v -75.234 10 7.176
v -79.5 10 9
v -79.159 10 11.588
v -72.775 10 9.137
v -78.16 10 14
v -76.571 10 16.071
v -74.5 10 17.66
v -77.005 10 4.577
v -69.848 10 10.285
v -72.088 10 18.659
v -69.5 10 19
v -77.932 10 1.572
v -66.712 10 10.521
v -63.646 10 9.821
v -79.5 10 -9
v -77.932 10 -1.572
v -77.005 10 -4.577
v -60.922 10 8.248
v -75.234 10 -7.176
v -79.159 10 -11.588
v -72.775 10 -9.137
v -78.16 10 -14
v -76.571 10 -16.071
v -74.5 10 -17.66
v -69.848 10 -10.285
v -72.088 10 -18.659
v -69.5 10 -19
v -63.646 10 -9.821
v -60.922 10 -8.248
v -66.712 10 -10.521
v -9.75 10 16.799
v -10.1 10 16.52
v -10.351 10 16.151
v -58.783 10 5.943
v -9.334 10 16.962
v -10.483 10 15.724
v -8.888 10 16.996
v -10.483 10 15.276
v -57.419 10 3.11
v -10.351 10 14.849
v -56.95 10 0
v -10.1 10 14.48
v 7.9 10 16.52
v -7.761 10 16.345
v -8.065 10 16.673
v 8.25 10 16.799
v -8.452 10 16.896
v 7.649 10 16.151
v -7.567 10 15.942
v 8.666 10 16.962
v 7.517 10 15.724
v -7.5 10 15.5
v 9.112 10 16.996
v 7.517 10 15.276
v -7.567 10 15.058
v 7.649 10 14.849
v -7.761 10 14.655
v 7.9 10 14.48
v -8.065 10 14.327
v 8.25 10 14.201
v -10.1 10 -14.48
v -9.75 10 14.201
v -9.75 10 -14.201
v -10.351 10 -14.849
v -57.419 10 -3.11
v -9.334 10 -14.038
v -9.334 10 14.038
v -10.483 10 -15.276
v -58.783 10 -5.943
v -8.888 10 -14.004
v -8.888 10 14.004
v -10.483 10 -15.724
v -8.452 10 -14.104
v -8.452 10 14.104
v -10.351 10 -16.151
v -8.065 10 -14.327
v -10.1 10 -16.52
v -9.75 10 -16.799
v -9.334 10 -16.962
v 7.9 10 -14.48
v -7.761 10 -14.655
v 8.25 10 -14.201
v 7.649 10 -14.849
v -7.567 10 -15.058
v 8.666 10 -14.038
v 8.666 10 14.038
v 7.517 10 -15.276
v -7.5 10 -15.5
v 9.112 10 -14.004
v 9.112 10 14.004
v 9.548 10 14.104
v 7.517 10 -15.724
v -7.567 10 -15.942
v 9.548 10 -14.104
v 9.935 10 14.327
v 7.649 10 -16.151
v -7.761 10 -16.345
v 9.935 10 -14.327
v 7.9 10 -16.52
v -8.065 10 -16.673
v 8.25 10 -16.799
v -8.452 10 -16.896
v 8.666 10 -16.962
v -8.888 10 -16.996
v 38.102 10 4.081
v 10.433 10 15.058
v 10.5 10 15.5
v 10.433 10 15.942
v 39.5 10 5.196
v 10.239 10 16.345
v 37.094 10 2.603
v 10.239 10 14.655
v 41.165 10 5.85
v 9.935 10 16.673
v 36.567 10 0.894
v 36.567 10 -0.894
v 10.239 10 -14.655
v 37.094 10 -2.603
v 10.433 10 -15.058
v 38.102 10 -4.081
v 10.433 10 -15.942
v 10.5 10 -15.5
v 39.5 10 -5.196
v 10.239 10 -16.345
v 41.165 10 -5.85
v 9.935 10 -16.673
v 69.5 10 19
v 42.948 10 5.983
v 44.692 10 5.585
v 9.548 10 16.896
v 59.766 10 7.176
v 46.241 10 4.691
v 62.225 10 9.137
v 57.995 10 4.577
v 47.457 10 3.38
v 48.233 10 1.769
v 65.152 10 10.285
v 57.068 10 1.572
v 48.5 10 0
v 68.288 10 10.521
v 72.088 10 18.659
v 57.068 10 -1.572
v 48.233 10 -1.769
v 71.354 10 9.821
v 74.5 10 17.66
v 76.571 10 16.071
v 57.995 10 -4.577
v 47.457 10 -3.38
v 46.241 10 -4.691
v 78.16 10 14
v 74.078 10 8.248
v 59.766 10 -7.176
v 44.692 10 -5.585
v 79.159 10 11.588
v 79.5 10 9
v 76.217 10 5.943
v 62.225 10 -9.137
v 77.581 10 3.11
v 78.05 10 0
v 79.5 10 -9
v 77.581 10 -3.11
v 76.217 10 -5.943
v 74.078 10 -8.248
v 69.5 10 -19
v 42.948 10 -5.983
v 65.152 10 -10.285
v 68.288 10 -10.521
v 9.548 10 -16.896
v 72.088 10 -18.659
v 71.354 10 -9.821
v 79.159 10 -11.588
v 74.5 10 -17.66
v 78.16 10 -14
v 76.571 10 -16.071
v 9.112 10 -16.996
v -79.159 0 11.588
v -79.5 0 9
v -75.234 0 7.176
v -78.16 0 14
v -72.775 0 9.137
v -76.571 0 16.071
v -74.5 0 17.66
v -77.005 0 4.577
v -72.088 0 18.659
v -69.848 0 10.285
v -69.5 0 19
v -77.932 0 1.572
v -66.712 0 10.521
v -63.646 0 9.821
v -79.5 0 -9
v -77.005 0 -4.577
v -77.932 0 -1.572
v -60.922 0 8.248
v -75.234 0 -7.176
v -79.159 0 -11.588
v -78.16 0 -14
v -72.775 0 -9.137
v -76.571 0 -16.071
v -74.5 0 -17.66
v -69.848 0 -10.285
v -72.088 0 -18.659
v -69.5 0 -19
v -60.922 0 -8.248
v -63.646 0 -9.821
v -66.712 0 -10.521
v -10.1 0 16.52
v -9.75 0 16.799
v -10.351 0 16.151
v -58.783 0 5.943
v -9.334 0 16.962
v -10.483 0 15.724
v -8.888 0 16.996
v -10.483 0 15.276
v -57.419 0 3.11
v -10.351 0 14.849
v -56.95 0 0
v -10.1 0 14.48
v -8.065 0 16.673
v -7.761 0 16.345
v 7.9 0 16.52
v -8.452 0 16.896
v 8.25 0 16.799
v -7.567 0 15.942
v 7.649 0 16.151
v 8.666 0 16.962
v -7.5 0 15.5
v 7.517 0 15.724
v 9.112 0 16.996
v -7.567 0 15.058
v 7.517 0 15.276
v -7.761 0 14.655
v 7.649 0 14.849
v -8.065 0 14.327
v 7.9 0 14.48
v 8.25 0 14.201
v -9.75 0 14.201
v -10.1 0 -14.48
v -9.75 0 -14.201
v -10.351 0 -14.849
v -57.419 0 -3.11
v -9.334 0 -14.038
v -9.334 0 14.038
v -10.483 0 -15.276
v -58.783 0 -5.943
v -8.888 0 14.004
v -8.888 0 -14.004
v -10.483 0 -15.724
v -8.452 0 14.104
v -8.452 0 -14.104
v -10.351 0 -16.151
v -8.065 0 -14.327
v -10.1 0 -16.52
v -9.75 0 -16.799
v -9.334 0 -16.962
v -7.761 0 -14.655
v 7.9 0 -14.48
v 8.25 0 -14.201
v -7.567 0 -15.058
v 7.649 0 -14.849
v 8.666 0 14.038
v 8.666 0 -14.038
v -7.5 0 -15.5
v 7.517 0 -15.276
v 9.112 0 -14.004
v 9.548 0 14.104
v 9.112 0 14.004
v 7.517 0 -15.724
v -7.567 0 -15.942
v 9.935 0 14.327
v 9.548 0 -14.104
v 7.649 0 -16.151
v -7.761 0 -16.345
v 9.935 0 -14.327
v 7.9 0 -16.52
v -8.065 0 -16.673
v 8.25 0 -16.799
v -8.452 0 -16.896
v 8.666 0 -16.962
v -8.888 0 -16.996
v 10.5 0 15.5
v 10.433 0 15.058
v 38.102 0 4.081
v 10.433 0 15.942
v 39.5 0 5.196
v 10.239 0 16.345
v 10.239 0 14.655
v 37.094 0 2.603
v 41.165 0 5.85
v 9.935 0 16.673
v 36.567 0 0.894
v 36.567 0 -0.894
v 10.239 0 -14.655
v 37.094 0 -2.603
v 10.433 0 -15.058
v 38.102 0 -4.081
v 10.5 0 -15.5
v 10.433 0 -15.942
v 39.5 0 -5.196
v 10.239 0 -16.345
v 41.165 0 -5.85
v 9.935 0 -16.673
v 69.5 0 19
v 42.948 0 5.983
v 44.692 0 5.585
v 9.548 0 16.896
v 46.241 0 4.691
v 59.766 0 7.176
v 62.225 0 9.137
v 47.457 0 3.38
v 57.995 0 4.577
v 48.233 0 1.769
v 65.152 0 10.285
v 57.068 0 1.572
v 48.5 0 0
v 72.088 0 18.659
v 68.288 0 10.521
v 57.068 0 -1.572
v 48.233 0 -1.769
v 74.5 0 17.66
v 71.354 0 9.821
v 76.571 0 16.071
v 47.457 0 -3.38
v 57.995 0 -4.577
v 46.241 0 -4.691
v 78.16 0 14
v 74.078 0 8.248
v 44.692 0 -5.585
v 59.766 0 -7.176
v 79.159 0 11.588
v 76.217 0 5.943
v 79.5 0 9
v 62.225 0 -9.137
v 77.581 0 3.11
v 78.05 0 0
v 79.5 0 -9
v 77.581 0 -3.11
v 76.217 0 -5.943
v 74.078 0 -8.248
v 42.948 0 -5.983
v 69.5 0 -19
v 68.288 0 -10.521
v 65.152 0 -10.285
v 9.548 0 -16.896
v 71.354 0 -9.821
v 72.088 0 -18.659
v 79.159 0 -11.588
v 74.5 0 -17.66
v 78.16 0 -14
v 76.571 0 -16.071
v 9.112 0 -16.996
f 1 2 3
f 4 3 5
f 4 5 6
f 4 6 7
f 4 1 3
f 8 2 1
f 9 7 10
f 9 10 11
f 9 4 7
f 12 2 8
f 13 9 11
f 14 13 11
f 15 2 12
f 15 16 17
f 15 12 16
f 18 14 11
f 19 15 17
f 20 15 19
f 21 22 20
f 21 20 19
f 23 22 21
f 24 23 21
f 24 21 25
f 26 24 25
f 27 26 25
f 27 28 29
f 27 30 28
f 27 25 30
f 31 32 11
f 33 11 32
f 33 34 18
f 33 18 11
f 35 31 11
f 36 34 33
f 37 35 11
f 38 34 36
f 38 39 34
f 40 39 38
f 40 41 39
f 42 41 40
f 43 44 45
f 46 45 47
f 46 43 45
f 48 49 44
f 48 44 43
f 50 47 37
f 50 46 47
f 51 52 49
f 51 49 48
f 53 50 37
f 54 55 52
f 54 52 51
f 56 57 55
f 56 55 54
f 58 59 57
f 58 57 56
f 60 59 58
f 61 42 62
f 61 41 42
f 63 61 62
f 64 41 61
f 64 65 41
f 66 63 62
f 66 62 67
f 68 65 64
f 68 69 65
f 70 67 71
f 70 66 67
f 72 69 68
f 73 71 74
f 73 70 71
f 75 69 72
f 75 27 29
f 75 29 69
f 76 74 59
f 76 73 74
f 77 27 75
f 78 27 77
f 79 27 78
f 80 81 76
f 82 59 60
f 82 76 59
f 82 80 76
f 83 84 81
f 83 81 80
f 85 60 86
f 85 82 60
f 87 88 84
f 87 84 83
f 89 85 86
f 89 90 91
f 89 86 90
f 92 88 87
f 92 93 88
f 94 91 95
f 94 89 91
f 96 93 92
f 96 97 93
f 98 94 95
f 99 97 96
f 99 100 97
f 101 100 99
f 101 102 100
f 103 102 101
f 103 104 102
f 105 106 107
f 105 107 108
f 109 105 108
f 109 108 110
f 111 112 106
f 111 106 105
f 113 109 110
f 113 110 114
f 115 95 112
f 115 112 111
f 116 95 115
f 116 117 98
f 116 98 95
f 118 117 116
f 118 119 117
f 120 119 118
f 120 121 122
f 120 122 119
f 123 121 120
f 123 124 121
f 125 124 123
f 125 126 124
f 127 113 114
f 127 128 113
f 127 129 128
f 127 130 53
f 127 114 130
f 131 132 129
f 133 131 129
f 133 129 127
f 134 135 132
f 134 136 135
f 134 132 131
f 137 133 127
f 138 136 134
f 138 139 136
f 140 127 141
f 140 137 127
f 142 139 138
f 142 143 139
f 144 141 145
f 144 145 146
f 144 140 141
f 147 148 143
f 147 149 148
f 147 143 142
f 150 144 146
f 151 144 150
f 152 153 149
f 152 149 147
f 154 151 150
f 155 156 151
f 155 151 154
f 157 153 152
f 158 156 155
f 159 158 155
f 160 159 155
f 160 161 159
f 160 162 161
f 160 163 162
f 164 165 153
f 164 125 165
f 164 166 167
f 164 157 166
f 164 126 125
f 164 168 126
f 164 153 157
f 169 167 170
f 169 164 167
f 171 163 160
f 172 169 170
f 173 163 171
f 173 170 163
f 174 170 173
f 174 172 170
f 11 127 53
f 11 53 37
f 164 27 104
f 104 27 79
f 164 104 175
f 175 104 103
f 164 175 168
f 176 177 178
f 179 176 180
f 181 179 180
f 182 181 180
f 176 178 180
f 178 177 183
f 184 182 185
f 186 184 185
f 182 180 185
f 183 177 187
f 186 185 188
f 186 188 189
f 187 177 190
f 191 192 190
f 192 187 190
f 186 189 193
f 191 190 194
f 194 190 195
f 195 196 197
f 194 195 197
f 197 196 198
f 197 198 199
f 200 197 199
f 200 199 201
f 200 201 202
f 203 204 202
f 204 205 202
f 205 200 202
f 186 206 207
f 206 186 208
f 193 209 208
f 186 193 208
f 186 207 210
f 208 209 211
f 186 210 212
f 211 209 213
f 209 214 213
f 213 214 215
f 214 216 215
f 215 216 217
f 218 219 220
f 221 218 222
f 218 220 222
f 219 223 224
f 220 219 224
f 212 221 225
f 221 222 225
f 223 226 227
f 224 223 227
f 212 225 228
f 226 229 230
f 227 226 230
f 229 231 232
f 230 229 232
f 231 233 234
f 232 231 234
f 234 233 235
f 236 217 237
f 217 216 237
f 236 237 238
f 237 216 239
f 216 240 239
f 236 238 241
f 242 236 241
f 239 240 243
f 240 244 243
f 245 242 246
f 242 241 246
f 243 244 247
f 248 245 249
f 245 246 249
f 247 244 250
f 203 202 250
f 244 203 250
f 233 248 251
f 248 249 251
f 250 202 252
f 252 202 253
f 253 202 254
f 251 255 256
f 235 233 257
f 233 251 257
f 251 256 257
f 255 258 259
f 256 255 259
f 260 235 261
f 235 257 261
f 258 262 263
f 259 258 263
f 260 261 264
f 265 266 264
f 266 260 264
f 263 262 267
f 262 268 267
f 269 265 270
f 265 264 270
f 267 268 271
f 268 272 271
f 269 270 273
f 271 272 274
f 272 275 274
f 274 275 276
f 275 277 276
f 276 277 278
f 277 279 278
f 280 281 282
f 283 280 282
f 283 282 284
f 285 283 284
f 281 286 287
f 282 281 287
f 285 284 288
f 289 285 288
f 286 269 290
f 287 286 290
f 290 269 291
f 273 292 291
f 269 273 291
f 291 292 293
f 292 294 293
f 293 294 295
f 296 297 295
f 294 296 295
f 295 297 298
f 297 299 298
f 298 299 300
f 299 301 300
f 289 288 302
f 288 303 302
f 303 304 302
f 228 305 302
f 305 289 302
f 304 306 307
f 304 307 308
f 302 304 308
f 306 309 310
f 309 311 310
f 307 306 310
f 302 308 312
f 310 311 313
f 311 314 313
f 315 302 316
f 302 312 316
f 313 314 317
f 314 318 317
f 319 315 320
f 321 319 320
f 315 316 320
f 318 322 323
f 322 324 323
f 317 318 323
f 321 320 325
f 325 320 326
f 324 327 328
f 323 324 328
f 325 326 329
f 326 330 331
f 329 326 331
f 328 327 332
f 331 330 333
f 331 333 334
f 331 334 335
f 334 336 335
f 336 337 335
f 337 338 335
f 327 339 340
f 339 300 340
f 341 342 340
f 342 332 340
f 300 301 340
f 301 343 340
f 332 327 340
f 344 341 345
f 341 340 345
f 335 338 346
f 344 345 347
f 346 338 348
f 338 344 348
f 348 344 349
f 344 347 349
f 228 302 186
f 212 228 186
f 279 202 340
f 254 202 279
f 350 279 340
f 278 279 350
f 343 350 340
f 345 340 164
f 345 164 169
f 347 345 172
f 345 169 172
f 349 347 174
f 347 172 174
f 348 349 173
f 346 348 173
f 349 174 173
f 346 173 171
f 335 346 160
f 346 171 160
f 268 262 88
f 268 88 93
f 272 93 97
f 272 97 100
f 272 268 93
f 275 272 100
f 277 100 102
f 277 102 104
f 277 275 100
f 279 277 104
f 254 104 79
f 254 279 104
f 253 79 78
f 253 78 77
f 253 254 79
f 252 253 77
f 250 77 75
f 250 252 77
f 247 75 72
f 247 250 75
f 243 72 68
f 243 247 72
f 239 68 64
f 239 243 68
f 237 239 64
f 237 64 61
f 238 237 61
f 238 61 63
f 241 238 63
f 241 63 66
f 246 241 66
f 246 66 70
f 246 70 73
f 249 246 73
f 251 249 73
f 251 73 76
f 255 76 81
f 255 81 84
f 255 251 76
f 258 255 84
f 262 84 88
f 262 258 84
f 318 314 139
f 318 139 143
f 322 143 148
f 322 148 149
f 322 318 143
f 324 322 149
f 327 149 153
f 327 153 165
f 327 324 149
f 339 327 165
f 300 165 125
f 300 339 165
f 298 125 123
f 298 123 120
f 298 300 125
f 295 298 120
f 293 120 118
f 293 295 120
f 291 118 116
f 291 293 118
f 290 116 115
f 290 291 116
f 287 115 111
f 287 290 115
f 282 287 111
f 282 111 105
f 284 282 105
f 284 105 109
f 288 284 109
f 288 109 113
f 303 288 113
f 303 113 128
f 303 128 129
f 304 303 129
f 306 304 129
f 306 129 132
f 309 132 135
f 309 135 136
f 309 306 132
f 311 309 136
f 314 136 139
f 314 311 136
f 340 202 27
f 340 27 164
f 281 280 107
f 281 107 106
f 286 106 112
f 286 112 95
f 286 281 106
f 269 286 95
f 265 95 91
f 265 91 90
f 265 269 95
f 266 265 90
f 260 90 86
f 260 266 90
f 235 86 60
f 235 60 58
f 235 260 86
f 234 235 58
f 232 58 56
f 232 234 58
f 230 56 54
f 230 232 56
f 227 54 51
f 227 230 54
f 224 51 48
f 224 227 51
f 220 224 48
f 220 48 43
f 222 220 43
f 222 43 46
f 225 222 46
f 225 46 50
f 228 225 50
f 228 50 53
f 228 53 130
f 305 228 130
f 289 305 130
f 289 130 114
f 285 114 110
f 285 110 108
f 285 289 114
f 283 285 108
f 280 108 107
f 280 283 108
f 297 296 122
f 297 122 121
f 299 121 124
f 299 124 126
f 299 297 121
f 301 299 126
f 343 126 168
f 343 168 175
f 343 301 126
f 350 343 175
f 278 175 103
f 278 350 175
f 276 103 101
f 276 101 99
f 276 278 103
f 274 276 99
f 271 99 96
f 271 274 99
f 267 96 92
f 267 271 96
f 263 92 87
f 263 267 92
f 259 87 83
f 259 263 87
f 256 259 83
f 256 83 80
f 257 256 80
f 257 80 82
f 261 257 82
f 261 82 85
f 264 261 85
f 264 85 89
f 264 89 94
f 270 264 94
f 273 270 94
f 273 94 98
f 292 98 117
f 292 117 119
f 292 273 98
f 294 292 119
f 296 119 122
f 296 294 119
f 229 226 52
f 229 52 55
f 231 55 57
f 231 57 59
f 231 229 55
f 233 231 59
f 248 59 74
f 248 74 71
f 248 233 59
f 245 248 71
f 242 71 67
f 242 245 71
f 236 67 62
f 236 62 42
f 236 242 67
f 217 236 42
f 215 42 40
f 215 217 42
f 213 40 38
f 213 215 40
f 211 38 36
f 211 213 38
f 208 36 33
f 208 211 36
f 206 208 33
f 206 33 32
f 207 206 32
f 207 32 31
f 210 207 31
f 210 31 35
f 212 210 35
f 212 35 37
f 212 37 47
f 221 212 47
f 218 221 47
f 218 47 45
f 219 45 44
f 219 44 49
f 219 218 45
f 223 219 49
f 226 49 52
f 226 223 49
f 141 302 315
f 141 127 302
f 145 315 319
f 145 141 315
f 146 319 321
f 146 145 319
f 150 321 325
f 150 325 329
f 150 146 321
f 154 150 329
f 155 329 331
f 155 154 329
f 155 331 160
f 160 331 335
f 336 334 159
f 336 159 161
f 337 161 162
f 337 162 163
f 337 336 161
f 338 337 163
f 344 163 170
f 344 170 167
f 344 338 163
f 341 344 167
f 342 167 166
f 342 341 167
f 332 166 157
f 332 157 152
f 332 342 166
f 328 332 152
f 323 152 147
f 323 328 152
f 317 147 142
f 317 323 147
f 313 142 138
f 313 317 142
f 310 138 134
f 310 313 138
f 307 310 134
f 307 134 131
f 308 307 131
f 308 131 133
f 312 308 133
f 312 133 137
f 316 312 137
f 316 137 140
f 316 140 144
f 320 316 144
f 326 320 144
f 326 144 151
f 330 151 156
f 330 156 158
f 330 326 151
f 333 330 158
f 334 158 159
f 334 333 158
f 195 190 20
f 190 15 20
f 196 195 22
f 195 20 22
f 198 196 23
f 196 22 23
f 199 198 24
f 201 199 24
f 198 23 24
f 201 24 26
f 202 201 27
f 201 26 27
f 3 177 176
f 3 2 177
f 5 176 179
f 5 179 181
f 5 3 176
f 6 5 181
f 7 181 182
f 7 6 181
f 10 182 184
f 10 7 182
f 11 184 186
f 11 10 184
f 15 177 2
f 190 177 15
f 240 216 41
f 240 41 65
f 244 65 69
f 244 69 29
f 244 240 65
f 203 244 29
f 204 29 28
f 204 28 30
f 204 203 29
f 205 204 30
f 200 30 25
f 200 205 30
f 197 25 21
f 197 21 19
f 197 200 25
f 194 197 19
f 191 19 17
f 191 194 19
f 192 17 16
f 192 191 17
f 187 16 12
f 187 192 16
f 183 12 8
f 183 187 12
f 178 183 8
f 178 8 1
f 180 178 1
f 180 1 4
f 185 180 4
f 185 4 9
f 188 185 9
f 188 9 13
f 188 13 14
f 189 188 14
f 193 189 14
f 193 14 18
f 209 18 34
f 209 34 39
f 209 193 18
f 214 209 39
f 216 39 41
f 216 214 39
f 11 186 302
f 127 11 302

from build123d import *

# Parameters (mm, degrees)
SKETCH1_W           = 159
SKETCH1_H           = 38
SKETCH1_R           = 1.5
SKETCH1_R_2         = 10.55
SKETCH1_R_3         = 6
BOSS_EXTRUDE1_DEPTH = 10
FILLET1_R           = 10


with BuildPart() as part:
    # Sketch1 → Boss-Extrude1 (new body)
    with BuildSketch(Plane(origin=(0, 0, 0), x_dir=(1, 0, 0), z_dir=(0, 1, 0))):
        Rectangle(SKETCH1_W, SKETCH1_H)
        with Locations((9, 15.5)):
            Circle(SKETCH1_R, mode=Mode.SUBTRACT)
        with Locations((-9, 15.5)):
            Circle(SKETCH1_R, mode=Mode.SUBTRACT)
        with Locations((-9, -15.5)):
            Circle(SKETCH1_R, mode=Mode.SUBTRACT)
        with Locations((9, -15.5)):
            Circle(SKETCH1_R, mode=Mode.SUBTRACT)
        with Locations((-67.5, 0)):
            Circle(SKETCH1_R_2, mode=Mode.SUBTRACT)
        with Locations((67.5, 0)):
            Circle(SKETCH1_R_2, mode=Mode.SUBTRACT)
        with Locations((42.5, 0)):
            Circle(SKETCH1_R_3, mode=Mode.SUBTRACT)
    extrude(amount=BOSS_EXTRUDE1_DEPTH)

    # Fillet1
    fillet1_edges = [part.edges().sort_by_distance(p)[0] for p in [
        (79.5, 5, 19),
        (-79.5, 5, 19),
        (-79.5, 5, -19),
        (79.5, 5, -19),
    ]]
    fillet(fillet1_edges, radius=FILLET1_R)


solid = part.part
